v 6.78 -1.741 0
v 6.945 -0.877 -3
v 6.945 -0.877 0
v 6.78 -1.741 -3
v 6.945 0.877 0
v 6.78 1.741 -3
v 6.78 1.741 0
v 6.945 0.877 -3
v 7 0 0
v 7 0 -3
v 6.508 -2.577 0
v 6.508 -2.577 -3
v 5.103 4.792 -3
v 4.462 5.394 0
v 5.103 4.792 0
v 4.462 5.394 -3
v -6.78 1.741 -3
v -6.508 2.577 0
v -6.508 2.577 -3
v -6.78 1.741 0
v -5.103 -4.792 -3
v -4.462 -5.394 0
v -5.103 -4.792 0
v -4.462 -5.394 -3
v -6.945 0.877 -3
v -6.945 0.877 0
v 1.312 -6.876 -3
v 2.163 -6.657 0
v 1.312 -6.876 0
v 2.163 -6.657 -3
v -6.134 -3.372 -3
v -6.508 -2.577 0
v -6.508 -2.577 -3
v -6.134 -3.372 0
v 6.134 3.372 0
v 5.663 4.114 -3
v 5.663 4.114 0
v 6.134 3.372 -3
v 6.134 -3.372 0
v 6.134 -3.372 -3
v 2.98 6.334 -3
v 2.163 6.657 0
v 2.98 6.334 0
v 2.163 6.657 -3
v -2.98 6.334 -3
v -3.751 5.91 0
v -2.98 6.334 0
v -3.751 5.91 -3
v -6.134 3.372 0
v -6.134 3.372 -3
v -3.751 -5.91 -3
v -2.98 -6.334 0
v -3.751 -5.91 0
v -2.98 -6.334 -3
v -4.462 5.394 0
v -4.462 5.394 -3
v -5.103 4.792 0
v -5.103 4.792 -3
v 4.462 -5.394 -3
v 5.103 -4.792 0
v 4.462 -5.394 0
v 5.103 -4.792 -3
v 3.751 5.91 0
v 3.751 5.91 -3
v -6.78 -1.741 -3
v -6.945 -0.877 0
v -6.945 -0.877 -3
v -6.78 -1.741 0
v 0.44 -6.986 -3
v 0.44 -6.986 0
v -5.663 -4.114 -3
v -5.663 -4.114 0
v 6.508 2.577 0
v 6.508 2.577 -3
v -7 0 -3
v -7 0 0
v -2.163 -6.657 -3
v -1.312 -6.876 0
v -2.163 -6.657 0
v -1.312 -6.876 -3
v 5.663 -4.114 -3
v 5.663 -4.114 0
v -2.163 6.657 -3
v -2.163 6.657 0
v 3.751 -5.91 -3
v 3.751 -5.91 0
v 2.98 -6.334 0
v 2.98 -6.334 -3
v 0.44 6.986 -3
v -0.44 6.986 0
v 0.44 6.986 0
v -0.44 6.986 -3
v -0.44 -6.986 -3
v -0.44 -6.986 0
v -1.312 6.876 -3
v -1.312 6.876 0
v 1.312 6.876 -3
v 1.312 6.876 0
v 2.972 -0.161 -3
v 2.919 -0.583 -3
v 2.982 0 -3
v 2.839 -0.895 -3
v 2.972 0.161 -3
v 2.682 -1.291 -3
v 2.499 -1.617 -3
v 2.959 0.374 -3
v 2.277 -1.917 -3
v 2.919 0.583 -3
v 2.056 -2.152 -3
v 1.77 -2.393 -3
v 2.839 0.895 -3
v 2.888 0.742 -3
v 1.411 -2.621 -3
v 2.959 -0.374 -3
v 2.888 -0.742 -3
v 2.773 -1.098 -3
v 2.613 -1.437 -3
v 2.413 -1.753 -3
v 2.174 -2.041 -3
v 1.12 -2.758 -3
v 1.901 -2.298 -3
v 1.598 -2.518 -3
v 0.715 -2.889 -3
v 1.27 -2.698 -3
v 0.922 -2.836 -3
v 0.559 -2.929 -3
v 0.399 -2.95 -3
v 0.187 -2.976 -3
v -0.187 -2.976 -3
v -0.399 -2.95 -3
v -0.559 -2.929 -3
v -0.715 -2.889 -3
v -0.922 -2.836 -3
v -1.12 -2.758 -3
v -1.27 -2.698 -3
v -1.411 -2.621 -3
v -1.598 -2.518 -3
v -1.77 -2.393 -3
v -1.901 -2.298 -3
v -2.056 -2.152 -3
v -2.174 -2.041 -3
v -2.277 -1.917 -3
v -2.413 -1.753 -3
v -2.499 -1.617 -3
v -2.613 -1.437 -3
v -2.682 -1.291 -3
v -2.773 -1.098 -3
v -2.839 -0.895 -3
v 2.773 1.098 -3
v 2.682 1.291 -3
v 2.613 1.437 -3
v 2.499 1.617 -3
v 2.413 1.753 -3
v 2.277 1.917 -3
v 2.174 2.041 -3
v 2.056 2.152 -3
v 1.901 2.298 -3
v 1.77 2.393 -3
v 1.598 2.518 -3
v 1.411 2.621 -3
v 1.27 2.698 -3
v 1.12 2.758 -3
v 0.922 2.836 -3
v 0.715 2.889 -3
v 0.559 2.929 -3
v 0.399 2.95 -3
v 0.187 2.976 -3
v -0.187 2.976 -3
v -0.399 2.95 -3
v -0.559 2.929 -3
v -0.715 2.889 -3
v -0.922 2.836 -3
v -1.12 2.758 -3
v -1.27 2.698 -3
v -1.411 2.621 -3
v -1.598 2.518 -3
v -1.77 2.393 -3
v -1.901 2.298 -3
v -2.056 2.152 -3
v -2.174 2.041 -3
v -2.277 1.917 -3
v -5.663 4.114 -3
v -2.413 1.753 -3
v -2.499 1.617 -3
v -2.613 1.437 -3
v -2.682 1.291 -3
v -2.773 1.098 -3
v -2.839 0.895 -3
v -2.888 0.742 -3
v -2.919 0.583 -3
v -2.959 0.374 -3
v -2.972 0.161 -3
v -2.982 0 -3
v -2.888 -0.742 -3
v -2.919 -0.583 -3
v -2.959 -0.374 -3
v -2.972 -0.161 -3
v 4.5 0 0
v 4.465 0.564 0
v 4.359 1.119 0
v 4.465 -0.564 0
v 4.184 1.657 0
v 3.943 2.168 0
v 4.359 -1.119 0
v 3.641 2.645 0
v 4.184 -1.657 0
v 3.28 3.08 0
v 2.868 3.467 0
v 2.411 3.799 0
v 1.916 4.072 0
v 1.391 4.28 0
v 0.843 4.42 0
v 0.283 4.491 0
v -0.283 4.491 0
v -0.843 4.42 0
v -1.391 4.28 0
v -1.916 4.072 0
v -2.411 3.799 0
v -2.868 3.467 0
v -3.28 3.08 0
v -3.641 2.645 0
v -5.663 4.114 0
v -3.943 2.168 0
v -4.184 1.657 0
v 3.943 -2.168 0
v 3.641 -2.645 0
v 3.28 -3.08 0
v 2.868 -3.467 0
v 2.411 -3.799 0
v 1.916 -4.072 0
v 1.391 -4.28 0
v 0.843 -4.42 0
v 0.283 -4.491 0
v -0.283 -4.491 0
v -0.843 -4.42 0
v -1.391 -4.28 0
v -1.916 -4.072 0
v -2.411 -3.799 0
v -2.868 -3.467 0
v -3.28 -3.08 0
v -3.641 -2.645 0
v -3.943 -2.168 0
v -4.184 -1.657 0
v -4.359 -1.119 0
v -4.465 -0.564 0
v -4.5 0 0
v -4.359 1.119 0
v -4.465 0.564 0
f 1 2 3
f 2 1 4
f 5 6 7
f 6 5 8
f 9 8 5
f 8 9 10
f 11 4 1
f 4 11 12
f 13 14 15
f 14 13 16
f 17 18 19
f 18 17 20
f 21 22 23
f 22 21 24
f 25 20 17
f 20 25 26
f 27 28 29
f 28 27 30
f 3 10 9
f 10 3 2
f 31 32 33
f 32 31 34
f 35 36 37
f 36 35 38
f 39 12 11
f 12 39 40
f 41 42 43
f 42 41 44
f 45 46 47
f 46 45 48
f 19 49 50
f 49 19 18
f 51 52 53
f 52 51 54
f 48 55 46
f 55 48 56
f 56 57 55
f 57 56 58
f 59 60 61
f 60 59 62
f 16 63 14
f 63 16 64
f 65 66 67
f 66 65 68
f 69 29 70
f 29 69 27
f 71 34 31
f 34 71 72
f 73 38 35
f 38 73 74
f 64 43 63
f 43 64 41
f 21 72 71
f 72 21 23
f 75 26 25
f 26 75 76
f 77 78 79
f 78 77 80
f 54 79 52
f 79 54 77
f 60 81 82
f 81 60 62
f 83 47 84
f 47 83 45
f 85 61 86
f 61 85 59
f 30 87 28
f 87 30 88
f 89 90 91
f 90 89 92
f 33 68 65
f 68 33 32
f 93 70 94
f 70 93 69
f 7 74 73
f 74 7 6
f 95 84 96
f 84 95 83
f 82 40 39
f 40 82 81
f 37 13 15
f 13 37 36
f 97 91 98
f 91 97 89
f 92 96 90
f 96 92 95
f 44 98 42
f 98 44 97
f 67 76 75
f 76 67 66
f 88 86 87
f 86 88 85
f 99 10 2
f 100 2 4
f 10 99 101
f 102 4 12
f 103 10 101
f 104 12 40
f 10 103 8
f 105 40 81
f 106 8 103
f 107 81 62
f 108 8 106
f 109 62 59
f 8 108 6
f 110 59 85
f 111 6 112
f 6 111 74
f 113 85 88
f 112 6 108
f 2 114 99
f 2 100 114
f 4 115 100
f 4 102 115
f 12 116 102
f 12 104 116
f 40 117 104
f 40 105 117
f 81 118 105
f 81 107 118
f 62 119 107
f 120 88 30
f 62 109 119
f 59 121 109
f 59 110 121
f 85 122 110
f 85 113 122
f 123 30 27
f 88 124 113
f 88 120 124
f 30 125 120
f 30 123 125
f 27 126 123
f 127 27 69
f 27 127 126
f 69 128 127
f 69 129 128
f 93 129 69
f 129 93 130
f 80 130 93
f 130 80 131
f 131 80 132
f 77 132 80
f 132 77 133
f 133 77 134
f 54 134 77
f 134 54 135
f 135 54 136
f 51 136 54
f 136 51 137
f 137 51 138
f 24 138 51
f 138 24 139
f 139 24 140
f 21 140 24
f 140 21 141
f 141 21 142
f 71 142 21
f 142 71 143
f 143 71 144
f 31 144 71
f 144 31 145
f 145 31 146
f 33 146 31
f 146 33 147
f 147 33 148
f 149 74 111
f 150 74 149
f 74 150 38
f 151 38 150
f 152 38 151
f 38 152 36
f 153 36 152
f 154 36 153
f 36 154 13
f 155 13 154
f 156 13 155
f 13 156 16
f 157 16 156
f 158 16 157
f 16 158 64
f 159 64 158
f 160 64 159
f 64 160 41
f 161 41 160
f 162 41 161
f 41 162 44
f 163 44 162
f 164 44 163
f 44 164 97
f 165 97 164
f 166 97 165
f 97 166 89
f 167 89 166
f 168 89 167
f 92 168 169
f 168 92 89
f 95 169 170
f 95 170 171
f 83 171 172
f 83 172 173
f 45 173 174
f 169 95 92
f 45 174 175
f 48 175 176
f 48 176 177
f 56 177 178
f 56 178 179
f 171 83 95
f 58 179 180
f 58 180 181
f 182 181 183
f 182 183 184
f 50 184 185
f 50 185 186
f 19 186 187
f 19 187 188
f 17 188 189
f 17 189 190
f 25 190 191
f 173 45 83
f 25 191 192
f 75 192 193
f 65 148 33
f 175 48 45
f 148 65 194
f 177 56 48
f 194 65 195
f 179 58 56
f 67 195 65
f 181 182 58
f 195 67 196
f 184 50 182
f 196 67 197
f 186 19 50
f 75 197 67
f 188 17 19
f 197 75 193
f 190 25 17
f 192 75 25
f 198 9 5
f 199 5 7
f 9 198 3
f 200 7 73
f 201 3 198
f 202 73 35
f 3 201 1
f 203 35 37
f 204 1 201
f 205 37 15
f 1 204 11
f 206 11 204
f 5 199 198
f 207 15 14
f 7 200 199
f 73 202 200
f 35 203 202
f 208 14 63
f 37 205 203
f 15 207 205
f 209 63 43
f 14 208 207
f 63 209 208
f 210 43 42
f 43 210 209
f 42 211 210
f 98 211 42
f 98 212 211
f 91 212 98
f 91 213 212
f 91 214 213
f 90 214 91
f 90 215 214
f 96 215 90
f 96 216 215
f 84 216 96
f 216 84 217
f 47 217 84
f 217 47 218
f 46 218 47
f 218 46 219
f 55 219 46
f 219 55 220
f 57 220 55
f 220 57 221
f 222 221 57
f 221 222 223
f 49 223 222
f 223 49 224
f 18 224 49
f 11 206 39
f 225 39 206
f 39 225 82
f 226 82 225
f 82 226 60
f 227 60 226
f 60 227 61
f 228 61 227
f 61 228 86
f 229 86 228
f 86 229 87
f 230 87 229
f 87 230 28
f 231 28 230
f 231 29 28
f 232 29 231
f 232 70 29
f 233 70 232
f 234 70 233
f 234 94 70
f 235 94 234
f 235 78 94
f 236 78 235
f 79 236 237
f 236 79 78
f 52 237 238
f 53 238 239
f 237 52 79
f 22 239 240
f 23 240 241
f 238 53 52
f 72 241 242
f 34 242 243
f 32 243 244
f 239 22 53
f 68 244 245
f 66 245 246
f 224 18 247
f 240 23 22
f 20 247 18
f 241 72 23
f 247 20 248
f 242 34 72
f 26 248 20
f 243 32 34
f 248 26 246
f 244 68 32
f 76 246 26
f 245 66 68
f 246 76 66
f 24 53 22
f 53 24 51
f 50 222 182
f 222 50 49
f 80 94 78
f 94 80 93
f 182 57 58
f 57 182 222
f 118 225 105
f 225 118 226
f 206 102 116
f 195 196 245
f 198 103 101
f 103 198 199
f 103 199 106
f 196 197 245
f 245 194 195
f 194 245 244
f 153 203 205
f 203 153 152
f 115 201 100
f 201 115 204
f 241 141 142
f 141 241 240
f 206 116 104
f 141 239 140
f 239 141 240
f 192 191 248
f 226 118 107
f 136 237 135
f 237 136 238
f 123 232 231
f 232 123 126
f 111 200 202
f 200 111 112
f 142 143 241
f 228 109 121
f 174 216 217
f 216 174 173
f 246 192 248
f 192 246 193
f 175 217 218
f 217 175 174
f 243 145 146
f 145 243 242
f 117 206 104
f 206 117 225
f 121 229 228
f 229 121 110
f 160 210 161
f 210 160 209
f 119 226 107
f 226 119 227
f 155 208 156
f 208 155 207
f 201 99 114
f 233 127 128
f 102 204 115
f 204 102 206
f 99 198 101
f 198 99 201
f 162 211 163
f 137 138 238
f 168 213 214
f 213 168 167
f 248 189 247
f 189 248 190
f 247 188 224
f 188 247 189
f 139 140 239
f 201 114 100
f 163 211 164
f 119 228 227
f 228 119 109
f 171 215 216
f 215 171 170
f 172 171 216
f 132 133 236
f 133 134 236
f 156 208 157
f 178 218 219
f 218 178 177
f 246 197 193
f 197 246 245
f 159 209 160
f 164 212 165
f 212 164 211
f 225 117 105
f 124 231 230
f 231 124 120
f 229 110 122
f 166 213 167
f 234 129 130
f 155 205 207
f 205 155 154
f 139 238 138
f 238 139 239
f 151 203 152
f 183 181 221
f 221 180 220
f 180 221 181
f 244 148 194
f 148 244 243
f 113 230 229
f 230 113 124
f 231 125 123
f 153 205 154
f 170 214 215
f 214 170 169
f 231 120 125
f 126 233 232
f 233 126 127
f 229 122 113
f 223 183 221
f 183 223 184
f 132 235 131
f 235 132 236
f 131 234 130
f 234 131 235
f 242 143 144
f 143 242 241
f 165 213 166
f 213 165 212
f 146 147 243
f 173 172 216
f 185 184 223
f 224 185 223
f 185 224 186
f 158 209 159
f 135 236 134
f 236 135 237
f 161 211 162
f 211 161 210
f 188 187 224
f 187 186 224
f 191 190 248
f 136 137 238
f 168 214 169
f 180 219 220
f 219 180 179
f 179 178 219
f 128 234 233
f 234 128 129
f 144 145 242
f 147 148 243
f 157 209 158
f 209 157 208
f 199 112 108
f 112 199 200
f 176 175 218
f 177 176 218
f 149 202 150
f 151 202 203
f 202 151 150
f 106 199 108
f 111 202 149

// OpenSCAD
$fn = 50;


difference() {
	union() {
		translate(v = [0, 0, -3.0000000000]) {
			cylinder(h = 3, r = 7.0000000000);
		}
		translate(v = [0, 0, -3.0000000000]) {
			cylinder(h = 3, r = 2.8750000000);
		}
	}
	union() {
		translate(v = [0, 0, 0]) {
			rotate(a = [0, 0, 0]) {
				difference() {
					union() {
						translate(v = [0, 0, -3.0000000000]) {
							cylinder(h = 3, r = 2.2500000000);
						}
						translate(v = [0, 0, -4.2000000000]) {
							cylinder(h = 4.2000000000, r1 = 2.3750000000, r2 = 4.5000000000);
						}
						translate(v = [0, 0, -3.0000000000]) {
							cylinder(h = 3, r = 2.3750000000);
						}
						translate(v = [0, 0, -3.0000000000]) {
							cylinder(h = 3, r = 2.2500000000);
						}
					}
					union();
				}
			}
		}
	}
}
